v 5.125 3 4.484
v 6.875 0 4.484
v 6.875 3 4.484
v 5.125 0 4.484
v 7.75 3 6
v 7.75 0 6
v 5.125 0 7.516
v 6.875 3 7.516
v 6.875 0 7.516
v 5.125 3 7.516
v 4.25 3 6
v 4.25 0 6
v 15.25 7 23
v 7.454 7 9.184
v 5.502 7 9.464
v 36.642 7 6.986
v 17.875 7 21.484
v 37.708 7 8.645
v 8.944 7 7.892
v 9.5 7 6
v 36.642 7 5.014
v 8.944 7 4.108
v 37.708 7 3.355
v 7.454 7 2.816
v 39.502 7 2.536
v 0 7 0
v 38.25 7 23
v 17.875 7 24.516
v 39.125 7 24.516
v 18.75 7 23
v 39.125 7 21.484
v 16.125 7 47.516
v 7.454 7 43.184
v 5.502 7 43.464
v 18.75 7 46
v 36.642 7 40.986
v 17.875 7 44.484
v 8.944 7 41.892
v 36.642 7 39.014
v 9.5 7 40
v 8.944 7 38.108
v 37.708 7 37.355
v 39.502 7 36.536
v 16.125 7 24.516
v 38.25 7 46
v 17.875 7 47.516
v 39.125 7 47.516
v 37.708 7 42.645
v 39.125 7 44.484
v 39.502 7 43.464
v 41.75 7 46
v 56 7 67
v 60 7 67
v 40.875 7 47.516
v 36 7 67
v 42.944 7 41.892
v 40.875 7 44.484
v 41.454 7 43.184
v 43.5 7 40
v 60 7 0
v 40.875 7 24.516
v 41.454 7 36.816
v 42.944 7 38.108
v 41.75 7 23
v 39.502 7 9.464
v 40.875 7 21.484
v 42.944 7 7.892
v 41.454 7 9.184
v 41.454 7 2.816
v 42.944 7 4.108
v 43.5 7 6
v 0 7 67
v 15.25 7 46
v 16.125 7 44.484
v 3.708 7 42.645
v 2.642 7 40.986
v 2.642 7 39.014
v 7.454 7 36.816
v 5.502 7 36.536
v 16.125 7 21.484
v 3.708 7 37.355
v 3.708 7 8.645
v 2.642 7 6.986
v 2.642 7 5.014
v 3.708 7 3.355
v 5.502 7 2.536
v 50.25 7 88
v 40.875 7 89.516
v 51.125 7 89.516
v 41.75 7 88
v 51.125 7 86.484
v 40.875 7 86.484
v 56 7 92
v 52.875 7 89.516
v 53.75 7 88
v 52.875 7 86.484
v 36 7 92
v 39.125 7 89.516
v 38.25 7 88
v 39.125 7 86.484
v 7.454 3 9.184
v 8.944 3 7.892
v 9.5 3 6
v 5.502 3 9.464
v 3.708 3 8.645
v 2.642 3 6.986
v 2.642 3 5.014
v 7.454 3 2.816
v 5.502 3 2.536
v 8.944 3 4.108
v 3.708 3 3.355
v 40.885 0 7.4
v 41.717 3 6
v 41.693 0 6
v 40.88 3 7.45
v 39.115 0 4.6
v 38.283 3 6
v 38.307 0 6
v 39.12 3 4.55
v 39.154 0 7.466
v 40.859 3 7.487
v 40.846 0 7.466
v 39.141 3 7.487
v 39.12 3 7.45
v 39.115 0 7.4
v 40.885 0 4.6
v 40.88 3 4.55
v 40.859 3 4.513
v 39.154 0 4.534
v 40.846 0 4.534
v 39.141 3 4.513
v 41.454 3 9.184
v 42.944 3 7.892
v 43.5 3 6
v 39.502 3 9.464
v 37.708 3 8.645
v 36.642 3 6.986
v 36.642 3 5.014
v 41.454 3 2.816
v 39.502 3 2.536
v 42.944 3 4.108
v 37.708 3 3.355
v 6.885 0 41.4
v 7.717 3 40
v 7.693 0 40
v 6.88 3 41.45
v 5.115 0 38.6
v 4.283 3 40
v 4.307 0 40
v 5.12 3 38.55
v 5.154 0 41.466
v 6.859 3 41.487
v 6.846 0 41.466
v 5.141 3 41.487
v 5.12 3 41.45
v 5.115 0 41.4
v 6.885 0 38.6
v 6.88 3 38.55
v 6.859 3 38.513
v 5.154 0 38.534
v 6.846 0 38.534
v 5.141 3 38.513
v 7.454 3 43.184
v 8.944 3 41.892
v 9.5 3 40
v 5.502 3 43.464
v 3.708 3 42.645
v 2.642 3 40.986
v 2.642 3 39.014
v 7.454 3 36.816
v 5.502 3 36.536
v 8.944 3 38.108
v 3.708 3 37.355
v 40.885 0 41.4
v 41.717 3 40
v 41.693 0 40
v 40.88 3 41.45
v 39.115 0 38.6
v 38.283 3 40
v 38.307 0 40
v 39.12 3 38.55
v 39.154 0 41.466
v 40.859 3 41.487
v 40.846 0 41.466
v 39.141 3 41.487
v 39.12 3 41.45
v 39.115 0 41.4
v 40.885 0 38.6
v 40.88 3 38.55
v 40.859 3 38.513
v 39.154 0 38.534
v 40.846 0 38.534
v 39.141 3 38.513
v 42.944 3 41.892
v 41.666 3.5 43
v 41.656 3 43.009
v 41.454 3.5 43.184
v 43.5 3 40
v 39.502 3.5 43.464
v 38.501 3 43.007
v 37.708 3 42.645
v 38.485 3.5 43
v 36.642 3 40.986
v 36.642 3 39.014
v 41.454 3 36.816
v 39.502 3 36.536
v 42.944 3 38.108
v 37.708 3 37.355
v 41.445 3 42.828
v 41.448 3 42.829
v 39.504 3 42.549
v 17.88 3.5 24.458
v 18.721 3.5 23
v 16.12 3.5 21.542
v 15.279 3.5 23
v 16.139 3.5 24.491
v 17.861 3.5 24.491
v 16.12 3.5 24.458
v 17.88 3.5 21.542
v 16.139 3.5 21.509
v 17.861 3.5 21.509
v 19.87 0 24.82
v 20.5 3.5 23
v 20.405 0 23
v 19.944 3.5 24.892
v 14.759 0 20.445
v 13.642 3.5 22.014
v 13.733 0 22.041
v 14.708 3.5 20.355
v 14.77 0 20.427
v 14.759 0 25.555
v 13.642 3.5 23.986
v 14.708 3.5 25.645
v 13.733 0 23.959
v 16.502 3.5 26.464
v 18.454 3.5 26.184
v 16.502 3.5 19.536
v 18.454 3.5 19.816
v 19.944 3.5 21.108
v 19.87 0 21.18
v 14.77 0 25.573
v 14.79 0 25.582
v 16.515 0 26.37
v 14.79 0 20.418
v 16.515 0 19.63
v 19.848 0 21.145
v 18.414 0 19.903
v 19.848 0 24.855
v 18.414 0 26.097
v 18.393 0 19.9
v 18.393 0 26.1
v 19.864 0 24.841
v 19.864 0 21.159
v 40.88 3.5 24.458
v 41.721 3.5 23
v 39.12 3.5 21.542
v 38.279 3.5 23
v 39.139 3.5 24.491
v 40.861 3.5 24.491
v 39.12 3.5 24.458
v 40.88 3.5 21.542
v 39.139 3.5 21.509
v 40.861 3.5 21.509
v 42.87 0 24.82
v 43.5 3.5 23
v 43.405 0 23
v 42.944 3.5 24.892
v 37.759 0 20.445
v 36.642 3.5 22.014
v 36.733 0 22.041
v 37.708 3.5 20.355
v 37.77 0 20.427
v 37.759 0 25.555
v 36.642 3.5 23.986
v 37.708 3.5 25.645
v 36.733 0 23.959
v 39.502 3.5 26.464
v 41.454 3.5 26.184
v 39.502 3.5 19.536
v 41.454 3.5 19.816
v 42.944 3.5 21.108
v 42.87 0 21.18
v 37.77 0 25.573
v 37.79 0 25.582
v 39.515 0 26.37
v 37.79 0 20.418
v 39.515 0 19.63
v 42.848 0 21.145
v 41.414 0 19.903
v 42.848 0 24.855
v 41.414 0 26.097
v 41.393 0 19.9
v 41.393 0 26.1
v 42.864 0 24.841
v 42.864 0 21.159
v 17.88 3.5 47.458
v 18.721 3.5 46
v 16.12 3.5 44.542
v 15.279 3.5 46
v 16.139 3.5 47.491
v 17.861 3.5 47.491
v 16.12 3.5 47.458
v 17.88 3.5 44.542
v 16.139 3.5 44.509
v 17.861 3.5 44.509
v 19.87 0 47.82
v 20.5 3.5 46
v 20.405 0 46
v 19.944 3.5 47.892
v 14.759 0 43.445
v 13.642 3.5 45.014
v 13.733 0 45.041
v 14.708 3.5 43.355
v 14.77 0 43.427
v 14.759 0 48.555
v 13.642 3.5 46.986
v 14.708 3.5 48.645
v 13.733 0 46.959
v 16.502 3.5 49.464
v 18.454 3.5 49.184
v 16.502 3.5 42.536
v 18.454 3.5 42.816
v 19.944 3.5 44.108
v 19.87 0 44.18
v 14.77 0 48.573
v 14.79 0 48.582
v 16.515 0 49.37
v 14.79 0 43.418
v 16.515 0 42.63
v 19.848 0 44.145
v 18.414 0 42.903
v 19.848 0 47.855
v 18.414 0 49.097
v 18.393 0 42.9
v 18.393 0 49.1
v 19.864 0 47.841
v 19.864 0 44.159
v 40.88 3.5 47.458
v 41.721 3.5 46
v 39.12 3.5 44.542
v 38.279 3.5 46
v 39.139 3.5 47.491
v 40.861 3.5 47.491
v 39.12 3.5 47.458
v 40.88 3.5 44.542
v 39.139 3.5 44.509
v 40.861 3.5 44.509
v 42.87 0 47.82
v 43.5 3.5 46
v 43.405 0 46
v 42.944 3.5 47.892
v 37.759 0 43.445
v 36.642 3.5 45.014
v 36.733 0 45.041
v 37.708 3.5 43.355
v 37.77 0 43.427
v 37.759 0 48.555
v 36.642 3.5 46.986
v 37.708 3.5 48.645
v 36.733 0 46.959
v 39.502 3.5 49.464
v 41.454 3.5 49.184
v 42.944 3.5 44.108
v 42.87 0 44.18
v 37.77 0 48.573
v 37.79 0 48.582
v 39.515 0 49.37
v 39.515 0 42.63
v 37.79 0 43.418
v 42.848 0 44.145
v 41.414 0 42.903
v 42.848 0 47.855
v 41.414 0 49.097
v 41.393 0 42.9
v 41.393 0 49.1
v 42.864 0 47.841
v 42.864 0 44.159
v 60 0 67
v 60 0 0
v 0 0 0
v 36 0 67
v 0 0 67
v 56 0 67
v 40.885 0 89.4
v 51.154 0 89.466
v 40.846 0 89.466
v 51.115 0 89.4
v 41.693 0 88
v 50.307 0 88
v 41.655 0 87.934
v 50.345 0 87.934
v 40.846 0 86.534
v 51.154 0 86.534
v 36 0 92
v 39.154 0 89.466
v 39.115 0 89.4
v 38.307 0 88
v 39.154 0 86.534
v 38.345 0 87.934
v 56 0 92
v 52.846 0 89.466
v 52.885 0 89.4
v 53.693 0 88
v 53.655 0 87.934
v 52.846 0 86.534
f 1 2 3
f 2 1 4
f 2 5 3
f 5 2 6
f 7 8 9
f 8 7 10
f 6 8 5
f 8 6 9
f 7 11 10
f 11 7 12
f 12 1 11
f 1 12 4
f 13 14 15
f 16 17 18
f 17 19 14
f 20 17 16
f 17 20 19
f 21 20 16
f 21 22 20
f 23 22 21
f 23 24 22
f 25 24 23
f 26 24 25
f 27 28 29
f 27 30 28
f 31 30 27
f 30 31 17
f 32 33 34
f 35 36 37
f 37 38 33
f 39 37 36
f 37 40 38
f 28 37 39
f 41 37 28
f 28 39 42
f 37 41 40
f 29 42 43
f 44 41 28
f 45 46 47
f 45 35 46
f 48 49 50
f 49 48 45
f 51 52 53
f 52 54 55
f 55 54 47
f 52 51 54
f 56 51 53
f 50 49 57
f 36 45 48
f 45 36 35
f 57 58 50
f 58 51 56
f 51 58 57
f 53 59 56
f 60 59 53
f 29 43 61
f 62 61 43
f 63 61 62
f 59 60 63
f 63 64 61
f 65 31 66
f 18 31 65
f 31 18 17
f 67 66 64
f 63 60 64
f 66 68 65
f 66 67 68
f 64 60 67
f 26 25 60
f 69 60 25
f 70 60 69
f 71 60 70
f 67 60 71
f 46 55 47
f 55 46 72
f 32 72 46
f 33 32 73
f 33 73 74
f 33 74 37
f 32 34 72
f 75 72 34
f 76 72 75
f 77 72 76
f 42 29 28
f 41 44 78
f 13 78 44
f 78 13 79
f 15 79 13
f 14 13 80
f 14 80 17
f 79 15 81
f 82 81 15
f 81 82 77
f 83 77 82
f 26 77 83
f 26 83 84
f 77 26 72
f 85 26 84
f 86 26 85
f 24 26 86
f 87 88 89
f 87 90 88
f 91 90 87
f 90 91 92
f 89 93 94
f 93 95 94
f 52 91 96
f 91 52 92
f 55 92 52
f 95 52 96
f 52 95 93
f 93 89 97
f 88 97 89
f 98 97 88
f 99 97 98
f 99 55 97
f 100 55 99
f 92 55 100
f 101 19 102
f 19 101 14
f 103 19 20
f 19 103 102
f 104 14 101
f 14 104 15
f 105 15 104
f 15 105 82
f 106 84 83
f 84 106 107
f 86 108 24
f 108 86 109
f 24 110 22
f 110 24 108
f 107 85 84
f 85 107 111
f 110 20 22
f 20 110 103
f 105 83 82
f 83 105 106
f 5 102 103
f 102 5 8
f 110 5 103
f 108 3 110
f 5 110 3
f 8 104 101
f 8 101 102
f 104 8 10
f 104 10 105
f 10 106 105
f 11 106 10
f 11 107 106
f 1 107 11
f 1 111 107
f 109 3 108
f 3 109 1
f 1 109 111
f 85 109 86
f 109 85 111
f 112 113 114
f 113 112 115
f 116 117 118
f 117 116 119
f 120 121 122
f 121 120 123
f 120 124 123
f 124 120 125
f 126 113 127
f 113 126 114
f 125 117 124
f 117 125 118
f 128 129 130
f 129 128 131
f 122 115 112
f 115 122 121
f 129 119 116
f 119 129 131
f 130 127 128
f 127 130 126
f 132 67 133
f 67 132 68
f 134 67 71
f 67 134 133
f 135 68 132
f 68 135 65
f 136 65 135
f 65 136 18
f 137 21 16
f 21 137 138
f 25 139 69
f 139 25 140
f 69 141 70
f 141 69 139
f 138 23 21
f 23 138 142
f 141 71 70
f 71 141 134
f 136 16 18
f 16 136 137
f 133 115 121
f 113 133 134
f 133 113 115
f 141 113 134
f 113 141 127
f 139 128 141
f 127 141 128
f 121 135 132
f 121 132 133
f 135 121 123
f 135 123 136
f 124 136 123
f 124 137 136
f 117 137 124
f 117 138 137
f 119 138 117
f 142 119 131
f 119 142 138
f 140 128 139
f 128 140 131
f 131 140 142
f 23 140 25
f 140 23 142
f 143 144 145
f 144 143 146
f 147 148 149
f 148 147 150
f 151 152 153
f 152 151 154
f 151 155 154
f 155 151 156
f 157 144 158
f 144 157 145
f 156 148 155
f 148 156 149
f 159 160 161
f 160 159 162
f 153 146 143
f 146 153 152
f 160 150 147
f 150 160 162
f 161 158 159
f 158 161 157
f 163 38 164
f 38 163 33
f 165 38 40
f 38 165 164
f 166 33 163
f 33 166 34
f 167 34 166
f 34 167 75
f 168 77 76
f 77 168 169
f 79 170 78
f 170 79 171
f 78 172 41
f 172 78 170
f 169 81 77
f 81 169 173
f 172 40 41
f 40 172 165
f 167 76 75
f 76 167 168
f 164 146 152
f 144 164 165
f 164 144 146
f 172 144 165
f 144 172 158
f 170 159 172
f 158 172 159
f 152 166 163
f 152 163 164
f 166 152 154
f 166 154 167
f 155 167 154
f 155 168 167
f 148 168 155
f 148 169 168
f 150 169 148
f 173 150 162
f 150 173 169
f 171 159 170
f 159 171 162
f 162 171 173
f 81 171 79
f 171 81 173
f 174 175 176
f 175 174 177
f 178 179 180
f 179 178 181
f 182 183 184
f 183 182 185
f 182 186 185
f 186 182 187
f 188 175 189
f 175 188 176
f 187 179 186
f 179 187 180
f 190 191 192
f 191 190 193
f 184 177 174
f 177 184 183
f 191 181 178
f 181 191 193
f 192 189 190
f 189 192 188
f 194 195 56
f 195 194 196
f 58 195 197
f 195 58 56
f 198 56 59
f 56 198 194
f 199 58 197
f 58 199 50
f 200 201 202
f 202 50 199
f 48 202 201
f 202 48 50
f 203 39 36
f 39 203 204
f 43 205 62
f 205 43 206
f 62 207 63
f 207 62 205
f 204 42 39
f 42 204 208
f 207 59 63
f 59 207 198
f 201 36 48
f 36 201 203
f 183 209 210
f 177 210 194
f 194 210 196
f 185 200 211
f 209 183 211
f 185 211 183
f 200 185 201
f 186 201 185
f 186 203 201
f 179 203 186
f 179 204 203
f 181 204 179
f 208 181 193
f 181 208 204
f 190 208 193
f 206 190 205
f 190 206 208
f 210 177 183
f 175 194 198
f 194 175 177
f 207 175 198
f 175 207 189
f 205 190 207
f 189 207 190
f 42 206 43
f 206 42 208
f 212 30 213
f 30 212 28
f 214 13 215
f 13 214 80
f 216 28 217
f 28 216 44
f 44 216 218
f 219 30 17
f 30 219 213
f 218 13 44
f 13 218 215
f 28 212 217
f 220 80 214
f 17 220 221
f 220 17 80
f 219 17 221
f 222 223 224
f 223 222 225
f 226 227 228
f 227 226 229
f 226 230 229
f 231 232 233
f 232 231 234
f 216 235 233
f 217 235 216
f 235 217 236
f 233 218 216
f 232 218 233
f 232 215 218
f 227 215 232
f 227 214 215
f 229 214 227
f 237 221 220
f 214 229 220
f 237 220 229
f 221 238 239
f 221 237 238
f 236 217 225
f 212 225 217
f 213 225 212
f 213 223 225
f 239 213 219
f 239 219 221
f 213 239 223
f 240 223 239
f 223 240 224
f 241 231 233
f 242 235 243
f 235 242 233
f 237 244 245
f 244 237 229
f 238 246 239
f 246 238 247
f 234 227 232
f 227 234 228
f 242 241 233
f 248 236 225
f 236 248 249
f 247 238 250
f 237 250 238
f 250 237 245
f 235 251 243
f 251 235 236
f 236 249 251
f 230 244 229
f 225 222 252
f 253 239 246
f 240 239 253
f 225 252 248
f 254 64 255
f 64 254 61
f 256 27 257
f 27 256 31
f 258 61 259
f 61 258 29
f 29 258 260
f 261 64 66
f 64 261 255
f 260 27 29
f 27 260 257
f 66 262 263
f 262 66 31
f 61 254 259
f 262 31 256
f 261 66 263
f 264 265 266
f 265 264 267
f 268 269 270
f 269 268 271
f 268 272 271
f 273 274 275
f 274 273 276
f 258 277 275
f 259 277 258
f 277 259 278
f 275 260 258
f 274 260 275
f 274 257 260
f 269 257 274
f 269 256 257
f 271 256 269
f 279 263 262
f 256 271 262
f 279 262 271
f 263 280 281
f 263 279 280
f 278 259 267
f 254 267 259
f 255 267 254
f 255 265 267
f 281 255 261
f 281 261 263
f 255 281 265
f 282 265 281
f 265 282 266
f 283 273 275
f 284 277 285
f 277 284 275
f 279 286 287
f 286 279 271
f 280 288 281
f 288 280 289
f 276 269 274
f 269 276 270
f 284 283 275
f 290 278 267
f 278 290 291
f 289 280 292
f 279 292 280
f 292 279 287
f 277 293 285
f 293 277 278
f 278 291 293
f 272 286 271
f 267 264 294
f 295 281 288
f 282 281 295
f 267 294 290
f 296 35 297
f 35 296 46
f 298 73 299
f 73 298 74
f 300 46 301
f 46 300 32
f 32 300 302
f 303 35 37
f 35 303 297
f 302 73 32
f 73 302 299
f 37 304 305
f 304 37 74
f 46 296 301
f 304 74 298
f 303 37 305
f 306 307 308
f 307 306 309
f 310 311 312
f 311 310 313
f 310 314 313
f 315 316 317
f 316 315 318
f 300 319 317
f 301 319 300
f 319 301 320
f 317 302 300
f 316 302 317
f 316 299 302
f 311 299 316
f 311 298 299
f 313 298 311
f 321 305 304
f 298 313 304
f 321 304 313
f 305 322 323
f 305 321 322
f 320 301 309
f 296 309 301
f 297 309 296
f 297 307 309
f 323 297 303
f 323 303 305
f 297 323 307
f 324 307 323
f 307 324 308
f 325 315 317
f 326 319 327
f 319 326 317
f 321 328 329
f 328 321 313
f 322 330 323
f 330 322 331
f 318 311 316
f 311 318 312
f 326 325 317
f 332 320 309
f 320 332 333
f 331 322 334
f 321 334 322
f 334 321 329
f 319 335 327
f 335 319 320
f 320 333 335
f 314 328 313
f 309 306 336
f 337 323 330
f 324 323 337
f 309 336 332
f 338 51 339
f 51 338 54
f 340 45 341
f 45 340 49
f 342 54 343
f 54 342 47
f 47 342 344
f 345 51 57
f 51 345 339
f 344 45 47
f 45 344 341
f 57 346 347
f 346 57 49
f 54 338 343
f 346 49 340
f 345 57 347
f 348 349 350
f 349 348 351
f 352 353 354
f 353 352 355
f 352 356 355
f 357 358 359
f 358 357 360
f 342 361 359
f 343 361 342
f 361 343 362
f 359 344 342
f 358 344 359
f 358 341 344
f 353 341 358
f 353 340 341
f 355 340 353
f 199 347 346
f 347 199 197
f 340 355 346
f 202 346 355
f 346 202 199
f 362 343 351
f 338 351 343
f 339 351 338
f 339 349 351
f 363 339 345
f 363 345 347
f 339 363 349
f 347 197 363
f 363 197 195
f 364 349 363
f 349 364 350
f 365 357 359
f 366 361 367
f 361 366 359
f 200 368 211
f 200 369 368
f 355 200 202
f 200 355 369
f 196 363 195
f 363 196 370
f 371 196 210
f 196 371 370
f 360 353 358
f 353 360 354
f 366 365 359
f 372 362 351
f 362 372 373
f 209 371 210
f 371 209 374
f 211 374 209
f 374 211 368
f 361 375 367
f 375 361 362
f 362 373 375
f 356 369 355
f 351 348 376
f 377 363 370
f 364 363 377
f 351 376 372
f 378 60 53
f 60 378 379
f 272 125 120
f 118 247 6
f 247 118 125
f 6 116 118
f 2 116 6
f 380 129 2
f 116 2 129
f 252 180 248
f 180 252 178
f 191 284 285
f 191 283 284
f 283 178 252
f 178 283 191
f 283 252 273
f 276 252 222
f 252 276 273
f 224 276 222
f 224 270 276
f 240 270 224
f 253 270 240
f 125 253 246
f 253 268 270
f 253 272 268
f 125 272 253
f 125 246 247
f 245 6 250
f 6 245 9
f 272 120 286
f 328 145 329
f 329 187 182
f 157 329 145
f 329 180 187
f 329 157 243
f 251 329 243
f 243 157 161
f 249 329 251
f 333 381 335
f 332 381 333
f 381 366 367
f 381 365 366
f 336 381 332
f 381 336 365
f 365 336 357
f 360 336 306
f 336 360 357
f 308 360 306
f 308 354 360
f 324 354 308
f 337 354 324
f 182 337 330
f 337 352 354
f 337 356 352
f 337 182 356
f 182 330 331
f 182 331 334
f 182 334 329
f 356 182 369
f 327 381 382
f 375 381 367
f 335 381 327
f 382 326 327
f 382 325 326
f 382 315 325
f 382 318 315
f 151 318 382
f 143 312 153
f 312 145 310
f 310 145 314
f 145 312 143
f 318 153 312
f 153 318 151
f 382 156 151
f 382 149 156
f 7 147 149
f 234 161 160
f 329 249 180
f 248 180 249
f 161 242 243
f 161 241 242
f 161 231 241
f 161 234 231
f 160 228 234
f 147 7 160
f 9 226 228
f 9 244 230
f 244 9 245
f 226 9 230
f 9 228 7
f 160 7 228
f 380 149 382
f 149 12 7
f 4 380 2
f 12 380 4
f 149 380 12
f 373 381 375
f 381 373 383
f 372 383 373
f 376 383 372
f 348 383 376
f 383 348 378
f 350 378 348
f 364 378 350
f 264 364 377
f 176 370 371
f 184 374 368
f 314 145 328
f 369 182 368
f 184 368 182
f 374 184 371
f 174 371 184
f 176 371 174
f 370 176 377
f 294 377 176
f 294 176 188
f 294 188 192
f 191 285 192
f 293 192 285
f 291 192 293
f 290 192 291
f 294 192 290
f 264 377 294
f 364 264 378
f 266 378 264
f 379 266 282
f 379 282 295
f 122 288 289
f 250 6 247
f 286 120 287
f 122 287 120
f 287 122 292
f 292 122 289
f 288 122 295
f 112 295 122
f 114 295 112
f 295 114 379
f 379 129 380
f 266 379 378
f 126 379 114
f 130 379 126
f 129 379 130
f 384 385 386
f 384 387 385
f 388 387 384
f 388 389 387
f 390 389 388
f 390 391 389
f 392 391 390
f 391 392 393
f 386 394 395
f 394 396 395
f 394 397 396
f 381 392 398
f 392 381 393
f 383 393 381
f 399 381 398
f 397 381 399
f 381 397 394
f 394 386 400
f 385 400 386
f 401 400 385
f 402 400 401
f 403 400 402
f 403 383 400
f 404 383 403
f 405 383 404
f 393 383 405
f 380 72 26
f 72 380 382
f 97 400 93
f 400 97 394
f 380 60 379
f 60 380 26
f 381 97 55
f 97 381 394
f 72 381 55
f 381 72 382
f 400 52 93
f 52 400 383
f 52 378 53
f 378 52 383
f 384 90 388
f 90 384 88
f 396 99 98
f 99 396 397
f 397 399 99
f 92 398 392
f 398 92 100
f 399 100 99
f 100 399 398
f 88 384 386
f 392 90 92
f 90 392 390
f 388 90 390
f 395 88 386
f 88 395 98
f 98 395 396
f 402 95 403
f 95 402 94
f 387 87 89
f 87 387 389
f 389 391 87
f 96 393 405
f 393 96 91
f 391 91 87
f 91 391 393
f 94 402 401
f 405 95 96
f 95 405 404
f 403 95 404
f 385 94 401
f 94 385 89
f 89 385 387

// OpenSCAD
m3 = 1.75;
m3_sinkhole = 3.5;
sinkhole_height = 4;
border = 6;
thickness = 7;
width = 60; //92;
height = 92;
hermes_hole_distance = 34;
prusa_hole_distance = 23;
prusa_border_x = 17;
prusa_border_y = 23;
cable_lip_width = 20;
cable_lip_height = 25;
cable_lip_gap_right = 4;
cable_lip_distance = 4;
cable_lip_gap_left = width - cable_lip_width - cable_lip_gap_right;

translate([0, thickness, 0])
{
    rotate(a = [90, 0 , 0])
    {
        difference()
        {
            cube([width, height, thickness]);
            
            // Hermes lower left hole.
            translate([border, border, 0])
            {
                cylinder(h = height, r1 = m3, r2 = m3);
                cylinder(h = sinkhole_height, r1 = m3_sinkhole, r2 = m3_sinkhole);   
            }
            
            // Hermes lower right hole.
            translate([border + hermes_hole_distance, border, 0])
            {
                cylinder(h = height, r1 = m3);
                cylinder(h = sinkhole_height, r1 = m3_sinkhole, r2 = m3_sinkhole);
            }
            
            // Hermes higher left hole.
            translate([border, border + hermes_hole_distance, 0])
            {
                cylinder(h = height, r1 = m3);
                cylinder(h = sinkhole_height, r1 = m3_sinkhole, r2 = m3_sinkhole);
            }
            
            // Hermes higher right hole.
            translate([border + hermes_hole_distance, border + hermes_hole_distance, 0])
            {
                cylinder(h = height, r1 = m3);
                cylinder(h = sinkhole_height, r1 = m3_sinkhole, r2 = m3_sinkhole);
            }
            
            // Prusa lower left hole.
            translate([prusa_border_x, prusa_border_y, 0])
            {
                cylinder(h = height, r1 = m3);
                translate([0, 0, thickness / 2])
                {
                    cylinder(h = height, r1 = m3_sinkhole);
                }      
            }
            
            // Prusa lower right hole.
            translate([prusa_border_x + prusa_hole_distance, prusa_border_y, 0])
            {
                cylinder(h = height, r1 = m3);
                translate([0, 0, thickness / 2])
                {
                    cylinder(h = height, r1 = m3_sinkhole);
                }
            }
            
            // Prusa higher left hole.
            translate([prusa_border_x, prusa_border_y + prusa_hole_distance, 0])
            {
                cylinder(h = height, r1 = m3);
                translate([0, 0, thickness / 2])
                {
                    cylinder(h = height, r1 = m3_sinkhole);
                } 
            }
            
            // Prusa higher right hole.
            translate([prusa_border_x + prusa_hole_distance, prusa_border_y + prusa_hole_distance, 0])
            {
                cylinder(h = height, r1 = m3);
                translate([0, 0, thickness / 2])
                {
                    cylinder(h = height, r1 = m3_sinkhole);
                } 
            }   
            
            // Cut-out of top-left corner.
            translate([0, height - cable_lip_height, 0])
            {
                cube([cable_lip_gap_left, cable_lip_height, thickness]);
            }
            
            // Cut-out of right-top corner.
            translate([width - cable_lip_gap_right, height - cable_lip_height, 0])
            {
                cube([cable_lip_gap_right, cable_lip_height, thickness]);
            }
            
            // Hole for tie-wrap, left.
            translate([cable_lip_gap_left + cable_lip_distance, height - cable_lip_distance, 0])
            {
                cylinder(h = height, r1 = m3);
            }
            
            // Hole for tie-wrap, right.
            translate([cable_lip_gap_left + cable_lip_width - cable_lip_distance, height - cable_lip_distance, 0])
            {
                cylinder(h = height, r1 = m3);
            }
            
        }
    }
}
